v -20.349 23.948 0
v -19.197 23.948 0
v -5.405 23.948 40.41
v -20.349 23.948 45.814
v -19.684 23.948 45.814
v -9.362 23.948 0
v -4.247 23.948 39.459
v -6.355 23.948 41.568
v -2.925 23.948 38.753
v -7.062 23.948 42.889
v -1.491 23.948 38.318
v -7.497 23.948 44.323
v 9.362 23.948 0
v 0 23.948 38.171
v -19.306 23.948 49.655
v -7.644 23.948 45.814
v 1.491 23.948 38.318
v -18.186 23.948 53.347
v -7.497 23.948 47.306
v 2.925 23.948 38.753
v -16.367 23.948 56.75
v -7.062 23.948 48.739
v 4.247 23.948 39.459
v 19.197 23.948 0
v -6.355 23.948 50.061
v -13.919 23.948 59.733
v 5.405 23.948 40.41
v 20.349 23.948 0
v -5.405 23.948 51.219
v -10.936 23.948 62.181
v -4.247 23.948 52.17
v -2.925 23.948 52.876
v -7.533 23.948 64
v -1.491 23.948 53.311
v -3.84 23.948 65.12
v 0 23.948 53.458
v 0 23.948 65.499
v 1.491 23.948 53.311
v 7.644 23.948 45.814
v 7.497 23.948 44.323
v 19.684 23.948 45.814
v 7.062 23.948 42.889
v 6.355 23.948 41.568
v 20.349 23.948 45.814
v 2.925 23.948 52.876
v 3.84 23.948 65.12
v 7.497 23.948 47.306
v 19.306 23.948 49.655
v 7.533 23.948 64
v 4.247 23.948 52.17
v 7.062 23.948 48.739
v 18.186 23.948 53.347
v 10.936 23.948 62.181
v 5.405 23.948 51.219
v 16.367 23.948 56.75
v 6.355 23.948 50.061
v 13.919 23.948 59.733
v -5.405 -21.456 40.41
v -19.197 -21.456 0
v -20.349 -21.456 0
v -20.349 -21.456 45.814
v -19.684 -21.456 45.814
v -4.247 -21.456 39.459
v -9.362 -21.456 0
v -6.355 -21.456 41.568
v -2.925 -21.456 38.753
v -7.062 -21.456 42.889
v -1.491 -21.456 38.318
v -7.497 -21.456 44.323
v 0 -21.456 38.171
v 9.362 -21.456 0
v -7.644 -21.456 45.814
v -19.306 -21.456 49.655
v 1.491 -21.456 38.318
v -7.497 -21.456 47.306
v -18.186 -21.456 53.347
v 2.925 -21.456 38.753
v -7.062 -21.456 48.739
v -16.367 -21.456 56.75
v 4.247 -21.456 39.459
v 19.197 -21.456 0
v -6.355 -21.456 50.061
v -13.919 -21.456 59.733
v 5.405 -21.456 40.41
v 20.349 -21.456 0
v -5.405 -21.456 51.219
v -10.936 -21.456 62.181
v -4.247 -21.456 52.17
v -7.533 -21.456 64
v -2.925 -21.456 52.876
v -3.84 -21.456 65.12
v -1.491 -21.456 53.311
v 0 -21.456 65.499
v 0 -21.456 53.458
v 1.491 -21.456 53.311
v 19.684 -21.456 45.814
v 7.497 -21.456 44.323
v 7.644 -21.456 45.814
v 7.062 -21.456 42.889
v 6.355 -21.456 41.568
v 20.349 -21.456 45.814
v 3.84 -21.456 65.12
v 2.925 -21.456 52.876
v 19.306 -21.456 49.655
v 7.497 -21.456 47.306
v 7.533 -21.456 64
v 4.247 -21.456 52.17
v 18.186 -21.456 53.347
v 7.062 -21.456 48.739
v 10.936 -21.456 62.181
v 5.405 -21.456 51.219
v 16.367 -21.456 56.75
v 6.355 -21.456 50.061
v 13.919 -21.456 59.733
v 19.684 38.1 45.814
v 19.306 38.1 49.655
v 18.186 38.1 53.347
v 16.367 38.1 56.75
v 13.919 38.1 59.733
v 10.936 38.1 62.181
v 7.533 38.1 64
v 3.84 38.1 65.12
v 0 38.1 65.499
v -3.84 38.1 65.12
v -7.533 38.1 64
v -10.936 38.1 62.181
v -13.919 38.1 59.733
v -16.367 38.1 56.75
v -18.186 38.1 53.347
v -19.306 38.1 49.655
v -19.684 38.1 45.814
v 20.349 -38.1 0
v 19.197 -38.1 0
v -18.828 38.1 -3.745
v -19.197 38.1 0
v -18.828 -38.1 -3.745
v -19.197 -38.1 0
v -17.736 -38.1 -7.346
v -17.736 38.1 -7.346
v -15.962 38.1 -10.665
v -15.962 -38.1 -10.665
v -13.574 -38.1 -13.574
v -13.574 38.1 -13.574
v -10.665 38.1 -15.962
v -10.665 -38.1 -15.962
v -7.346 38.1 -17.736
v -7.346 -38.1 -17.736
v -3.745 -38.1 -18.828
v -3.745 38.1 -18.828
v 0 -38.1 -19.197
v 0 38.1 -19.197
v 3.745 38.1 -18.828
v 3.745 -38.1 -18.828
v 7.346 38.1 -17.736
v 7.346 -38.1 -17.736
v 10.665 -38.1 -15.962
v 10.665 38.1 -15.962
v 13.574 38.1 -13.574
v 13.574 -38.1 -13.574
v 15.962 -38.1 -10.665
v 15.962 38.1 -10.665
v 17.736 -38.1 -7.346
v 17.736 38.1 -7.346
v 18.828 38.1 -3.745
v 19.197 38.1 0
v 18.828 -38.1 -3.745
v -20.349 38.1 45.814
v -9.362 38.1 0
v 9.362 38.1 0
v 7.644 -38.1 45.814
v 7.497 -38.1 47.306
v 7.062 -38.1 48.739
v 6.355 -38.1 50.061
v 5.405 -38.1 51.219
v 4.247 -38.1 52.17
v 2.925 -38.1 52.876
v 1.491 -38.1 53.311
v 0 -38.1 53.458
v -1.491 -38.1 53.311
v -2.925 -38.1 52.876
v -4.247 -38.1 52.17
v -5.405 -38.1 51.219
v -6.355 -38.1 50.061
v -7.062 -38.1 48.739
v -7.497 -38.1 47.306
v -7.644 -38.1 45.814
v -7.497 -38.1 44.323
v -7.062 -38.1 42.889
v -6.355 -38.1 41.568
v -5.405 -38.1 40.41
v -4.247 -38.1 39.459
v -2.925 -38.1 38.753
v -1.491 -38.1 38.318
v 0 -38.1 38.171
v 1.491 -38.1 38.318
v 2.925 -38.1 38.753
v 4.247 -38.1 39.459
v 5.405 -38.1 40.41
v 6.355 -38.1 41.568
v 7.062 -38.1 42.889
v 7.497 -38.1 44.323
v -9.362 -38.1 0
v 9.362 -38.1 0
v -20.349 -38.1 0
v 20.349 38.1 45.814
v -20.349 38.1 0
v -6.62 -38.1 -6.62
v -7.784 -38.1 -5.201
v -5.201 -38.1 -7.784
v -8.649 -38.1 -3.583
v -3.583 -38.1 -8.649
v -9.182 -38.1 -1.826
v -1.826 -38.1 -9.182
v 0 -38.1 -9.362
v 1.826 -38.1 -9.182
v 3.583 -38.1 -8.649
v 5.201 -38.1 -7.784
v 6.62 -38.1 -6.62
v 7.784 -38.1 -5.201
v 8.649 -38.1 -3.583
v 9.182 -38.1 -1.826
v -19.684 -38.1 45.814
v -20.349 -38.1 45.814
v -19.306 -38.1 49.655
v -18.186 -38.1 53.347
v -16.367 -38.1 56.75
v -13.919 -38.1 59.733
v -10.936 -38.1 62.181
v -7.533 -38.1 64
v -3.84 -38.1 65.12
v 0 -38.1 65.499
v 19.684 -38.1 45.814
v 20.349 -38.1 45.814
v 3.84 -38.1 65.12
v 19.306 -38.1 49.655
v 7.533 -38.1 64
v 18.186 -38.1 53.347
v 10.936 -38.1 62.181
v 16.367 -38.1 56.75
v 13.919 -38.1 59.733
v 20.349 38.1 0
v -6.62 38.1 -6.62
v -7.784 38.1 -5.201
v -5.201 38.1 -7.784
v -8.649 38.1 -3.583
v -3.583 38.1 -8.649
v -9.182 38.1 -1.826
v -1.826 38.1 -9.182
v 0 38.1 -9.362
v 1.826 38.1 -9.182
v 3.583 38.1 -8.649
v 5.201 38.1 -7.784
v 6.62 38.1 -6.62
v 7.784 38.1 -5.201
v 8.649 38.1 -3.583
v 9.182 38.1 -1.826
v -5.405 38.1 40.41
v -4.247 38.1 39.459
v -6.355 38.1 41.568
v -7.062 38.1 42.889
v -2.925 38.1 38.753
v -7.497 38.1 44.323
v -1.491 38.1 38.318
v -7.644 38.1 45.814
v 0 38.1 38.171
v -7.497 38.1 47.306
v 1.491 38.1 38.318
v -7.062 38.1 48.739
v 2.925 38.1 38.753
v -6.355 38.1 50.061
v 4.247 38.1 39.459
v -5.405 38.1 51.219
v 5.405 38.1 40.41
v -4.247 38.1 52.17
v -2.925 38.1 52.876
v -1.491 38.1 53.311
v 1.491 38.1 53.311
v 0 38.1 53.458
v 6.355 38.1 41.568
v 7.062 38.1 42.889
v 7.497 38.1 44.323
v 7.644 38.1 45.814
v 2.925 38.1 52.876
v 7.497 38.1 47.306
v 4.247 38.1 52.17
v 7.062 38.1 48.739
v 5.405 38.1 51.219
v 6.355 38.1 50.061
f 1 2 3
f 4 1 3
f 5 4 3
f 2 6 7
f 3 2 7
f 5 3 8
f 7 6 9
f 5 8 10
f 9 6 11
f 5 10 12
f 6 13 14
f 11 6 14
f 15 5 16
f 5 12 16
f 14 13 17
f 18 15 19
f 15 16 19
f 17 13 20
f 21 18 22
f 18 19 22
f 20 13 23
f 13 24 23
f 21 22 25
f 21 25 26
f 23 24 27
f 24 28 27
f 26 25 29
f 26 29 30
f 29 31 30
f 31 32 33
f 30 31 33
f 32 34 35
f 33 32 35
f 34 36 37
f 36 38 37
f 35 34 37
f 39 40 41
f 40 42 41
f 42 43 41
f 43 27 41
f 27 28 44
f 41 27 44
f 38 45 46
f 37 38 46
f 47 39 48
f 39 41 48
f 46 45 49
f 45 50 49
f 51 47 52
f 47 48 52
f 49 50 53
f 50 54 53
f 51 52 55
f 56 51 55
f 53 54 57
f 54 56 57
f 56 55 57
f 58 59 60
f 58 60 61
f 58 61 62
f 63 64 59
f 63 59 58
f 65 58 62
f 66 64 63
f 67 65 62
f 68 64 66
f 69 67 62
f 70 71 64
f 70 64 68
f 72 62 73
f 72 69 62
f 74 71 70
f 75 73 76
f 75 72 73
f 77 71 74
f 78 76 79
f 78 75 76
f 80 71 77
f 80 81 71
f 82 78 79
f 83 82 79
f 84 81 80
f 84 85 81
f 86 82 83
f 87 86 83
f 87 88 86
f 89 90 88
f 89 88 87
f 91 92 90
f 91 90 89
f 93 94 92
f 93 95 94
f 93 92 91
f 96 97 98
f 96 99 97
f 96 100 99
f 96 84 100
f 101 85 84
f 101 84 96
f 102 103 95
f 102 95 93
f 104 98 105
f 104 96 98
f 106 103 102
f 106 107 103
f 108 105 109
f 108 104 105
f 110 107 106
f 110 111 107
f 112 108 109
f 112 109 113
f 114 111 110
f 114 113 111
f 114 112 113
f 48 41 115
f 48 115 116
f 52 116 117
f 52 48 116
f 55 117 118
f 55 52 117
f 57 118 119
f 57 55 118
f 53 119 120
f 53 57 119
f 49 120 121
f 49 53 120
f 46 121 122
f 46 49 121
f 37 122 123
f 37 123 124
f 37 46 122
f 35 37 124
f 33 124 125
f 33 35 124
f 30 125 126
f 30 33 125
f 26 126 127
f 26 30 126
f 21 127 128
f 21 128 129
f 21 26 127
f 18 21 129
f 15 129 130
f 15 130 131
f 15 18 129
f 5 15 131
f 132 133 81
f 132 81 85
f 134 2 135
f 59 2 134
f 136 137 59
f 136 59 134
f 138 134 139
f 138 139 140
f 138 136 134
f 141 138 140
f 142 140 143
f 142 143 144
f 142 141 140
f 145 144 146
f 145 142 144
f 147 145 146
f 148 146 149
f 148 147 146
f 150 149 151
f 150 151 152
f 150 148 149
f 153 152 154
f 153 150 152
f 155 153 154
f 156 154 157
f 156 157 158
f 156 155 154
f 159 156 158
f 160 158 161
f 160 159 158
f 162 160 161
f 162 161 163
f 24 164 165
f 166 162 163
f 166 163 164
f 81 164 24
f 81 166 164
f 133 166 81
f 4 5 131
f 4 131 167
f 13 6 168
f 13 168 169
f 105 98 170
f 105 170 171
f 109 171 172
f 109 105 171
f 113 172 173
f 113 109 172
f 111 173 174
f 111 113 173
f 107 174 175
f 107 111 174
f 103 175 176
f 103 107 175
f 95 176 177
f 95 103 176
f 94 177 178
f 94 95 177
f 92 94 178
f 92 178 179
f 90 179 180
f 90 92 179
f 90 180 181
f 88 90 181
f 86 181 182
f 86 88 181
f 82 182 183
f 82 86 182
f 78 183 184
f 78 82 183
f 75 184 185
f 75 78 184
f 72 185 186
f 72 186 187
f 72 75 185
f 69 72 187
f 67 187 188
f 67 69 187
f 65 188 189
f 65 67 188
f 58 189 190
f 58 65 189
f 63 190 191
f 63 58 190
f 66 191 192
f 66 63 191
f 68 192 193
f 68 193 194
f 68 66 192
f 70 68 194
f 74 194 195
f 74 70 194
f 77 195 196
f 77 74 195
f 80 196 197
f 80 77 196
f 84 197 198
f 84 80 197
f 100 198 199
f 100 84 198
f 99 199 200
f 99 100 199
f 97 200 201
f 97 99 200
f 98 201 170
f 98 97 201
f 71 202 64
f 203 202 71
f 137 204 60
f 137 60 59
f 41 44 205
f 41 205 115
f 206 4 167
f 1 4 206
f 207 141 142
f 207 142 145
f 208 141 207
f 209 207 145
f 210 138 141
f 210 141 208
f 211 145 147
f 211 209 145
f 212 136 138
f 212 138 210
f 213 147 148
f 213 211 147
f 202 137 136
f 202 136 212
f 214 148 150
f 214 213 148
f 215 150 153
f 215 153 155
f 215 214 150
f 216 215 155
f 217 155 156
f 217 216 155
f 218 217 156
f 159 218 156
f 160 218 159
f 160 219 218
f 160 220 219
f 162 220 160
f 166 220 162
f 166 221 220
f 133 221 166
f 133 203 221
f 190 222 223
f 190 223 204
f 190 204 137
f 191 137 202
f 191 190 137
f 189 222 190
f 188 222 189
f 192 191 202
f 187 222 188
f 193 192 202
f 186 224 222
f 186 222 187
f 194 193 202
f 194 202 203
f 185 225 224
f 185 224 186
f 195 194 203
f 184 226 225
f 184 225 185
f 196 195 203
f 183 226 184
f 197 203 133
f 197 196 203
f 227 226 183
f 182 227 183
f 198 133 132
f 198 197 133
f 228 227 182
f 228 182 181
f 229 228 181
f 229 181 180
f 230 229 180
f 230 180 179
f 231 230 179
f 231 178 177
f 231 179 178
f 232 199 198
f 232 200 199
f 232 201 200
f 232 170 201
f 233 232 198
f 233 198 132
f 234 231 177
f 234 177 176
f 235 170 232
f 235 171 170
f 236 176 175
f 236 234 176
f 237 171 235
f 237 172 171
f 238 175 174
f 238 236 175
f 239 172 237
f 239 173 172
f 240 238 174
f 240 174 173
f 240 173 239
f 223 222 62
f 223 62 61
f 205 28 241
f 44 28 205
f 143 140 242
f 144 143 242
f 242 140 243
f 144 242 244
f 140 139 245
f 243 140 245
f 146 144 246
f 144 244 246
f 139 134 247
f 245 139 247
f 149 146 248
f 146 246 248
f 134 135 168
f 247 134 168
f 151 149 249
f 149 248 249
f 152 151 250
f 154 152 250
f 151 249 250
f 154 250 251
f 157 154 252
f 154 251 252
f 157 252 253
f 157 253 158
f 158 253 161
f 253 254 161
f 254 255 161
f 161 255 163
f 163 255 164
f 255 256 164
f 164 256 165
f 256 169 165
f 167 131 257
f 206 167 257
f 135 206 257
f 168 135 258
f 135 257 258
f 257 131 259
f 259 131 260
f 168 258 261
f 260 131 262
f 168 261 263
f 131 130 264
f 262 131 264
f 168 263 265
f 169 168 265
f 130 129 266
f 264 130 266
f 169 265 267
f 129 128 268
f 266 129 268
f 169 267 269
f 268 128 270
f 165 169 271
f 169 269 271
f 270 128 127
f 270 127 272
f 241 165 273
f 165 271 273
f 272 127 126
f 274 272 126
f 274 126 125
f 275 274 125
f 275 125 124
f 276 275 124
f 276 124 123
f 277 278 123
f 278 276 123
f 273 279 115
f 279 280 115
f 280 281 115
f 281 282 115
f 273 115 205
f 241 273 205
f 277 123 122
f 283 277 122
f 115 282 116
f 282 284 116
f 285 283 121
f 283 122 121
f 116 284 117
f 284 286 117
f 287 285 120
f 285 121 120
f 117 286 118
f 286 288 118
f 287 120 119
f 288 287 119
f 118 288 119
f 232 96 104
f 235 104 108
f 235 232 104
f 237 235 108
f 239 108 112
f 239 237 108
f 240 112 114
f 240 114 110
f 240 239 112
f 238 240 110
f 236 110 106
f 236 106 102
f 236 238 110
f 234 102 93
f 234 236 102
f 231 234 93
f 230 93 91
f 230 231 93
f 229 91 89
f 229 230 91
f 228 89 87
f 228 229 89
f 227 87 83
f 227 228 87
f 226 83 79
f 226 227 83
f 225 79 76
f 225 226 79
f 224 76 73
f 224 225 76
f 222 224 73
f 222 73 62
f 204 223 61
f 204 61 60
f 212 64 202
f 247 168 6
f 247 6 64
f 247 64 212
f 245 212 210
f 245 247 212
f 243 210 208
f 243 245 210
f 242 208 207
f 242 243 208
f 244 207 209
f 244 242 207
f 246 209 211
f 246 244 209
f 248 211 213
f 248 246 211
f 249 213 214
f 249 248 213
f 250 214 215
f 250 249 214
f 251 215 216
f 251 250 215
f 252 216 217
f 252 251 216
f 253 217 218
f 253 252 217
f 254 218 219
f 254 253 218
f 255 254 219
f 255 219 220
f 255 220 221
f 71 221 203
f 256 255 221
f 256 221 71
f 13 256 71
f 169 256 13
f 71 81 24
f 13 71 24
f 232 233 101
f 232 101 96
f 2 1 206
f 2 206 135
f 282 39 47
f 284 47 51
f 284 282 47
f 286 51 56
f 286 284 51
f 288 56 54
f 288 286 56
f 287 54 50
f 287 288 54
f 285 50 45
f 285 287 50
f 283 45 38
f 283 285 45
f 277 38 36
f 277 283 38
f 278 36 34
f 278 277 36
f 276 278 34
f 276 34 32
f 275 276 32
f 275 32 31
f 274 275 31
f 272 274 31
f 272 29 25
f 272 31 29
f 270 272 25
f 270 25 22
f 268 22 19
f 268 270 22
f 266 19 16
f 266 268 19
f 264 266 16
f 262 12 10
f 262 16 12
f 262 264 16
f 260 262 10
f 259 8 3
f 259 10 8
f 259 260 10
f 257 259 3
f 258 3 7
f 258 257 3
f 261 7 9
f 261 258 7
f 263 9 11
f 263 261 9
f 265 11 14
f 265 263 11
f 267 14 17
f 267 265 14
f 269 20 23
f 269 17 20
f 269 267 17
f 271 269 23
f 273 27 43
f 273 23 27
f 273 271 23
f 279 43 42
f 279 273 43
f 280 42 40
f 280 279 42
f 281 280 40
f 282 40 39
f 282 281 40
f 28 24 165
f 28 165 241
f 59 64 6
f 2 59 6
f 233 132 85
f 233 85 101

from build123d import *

# Parameters (mm, degrees)
F0_R     = 19.1968698124
F0_R_2   = 9.3617301333
F1_DEPTH = 38.1
F2_R     = 7.6435509614
F3_DEPTH = 38.1
F4_W     = 45.4035978764
F4_H     = 66.3013830781
F5_DEPTH = 114.3


with BuildPart() as f1:
    # F0 (on Front) → F1 (new body, symmetric)
    with BuildSketch(Plane.XZ):
        Circle(F0_R)
        Circle(F0_R_2, mode=Mode.SUBTRACT)
    extrude(amount=F1_DEPTH, both=True)

    # F2 (on Front) → F3 (join, symmetric)
    with BuildSketch(Plane.XZ):
        with BuildLine():
            Line((-20.3485637903, 45.8143912256), (-20.3485637903, 0))
            Line((-20.3485637903, 0), (20.3485637903, 0))
            Line((20.3485637903, 0), (20.3485637903, 45.8143912256))
            Line((20.3485637903, 45.8143912256), (19.6841994122, 45.8143912256))
            ThreePointArc((19.6841994122, 45.8143912256), (0, 65.4985906377), (-19.6841994122, 45.8143912256))
            Line((-19.6841994122, 45.8143912256), (-20.3485637903, 45.8143912256))
        make_face()
        with Locations((0, 45.8143912256)):
            Circle(F2_R, mode=Mode.SUBTRACT)
    extrude(amount=F3_DEPTH, both=True)

    # F4 (on Right) → F5 (cut, symmetric)
    with BuildSketch(Plane.YZ):
        with Locations((1.2458292767, 33.150691539)):
            Rectangle(F4_W, F4_H)
    extrude(amount=F5_DEPTH, both=True, mode=Mode.SUBTRACT)


solid = f1.part
